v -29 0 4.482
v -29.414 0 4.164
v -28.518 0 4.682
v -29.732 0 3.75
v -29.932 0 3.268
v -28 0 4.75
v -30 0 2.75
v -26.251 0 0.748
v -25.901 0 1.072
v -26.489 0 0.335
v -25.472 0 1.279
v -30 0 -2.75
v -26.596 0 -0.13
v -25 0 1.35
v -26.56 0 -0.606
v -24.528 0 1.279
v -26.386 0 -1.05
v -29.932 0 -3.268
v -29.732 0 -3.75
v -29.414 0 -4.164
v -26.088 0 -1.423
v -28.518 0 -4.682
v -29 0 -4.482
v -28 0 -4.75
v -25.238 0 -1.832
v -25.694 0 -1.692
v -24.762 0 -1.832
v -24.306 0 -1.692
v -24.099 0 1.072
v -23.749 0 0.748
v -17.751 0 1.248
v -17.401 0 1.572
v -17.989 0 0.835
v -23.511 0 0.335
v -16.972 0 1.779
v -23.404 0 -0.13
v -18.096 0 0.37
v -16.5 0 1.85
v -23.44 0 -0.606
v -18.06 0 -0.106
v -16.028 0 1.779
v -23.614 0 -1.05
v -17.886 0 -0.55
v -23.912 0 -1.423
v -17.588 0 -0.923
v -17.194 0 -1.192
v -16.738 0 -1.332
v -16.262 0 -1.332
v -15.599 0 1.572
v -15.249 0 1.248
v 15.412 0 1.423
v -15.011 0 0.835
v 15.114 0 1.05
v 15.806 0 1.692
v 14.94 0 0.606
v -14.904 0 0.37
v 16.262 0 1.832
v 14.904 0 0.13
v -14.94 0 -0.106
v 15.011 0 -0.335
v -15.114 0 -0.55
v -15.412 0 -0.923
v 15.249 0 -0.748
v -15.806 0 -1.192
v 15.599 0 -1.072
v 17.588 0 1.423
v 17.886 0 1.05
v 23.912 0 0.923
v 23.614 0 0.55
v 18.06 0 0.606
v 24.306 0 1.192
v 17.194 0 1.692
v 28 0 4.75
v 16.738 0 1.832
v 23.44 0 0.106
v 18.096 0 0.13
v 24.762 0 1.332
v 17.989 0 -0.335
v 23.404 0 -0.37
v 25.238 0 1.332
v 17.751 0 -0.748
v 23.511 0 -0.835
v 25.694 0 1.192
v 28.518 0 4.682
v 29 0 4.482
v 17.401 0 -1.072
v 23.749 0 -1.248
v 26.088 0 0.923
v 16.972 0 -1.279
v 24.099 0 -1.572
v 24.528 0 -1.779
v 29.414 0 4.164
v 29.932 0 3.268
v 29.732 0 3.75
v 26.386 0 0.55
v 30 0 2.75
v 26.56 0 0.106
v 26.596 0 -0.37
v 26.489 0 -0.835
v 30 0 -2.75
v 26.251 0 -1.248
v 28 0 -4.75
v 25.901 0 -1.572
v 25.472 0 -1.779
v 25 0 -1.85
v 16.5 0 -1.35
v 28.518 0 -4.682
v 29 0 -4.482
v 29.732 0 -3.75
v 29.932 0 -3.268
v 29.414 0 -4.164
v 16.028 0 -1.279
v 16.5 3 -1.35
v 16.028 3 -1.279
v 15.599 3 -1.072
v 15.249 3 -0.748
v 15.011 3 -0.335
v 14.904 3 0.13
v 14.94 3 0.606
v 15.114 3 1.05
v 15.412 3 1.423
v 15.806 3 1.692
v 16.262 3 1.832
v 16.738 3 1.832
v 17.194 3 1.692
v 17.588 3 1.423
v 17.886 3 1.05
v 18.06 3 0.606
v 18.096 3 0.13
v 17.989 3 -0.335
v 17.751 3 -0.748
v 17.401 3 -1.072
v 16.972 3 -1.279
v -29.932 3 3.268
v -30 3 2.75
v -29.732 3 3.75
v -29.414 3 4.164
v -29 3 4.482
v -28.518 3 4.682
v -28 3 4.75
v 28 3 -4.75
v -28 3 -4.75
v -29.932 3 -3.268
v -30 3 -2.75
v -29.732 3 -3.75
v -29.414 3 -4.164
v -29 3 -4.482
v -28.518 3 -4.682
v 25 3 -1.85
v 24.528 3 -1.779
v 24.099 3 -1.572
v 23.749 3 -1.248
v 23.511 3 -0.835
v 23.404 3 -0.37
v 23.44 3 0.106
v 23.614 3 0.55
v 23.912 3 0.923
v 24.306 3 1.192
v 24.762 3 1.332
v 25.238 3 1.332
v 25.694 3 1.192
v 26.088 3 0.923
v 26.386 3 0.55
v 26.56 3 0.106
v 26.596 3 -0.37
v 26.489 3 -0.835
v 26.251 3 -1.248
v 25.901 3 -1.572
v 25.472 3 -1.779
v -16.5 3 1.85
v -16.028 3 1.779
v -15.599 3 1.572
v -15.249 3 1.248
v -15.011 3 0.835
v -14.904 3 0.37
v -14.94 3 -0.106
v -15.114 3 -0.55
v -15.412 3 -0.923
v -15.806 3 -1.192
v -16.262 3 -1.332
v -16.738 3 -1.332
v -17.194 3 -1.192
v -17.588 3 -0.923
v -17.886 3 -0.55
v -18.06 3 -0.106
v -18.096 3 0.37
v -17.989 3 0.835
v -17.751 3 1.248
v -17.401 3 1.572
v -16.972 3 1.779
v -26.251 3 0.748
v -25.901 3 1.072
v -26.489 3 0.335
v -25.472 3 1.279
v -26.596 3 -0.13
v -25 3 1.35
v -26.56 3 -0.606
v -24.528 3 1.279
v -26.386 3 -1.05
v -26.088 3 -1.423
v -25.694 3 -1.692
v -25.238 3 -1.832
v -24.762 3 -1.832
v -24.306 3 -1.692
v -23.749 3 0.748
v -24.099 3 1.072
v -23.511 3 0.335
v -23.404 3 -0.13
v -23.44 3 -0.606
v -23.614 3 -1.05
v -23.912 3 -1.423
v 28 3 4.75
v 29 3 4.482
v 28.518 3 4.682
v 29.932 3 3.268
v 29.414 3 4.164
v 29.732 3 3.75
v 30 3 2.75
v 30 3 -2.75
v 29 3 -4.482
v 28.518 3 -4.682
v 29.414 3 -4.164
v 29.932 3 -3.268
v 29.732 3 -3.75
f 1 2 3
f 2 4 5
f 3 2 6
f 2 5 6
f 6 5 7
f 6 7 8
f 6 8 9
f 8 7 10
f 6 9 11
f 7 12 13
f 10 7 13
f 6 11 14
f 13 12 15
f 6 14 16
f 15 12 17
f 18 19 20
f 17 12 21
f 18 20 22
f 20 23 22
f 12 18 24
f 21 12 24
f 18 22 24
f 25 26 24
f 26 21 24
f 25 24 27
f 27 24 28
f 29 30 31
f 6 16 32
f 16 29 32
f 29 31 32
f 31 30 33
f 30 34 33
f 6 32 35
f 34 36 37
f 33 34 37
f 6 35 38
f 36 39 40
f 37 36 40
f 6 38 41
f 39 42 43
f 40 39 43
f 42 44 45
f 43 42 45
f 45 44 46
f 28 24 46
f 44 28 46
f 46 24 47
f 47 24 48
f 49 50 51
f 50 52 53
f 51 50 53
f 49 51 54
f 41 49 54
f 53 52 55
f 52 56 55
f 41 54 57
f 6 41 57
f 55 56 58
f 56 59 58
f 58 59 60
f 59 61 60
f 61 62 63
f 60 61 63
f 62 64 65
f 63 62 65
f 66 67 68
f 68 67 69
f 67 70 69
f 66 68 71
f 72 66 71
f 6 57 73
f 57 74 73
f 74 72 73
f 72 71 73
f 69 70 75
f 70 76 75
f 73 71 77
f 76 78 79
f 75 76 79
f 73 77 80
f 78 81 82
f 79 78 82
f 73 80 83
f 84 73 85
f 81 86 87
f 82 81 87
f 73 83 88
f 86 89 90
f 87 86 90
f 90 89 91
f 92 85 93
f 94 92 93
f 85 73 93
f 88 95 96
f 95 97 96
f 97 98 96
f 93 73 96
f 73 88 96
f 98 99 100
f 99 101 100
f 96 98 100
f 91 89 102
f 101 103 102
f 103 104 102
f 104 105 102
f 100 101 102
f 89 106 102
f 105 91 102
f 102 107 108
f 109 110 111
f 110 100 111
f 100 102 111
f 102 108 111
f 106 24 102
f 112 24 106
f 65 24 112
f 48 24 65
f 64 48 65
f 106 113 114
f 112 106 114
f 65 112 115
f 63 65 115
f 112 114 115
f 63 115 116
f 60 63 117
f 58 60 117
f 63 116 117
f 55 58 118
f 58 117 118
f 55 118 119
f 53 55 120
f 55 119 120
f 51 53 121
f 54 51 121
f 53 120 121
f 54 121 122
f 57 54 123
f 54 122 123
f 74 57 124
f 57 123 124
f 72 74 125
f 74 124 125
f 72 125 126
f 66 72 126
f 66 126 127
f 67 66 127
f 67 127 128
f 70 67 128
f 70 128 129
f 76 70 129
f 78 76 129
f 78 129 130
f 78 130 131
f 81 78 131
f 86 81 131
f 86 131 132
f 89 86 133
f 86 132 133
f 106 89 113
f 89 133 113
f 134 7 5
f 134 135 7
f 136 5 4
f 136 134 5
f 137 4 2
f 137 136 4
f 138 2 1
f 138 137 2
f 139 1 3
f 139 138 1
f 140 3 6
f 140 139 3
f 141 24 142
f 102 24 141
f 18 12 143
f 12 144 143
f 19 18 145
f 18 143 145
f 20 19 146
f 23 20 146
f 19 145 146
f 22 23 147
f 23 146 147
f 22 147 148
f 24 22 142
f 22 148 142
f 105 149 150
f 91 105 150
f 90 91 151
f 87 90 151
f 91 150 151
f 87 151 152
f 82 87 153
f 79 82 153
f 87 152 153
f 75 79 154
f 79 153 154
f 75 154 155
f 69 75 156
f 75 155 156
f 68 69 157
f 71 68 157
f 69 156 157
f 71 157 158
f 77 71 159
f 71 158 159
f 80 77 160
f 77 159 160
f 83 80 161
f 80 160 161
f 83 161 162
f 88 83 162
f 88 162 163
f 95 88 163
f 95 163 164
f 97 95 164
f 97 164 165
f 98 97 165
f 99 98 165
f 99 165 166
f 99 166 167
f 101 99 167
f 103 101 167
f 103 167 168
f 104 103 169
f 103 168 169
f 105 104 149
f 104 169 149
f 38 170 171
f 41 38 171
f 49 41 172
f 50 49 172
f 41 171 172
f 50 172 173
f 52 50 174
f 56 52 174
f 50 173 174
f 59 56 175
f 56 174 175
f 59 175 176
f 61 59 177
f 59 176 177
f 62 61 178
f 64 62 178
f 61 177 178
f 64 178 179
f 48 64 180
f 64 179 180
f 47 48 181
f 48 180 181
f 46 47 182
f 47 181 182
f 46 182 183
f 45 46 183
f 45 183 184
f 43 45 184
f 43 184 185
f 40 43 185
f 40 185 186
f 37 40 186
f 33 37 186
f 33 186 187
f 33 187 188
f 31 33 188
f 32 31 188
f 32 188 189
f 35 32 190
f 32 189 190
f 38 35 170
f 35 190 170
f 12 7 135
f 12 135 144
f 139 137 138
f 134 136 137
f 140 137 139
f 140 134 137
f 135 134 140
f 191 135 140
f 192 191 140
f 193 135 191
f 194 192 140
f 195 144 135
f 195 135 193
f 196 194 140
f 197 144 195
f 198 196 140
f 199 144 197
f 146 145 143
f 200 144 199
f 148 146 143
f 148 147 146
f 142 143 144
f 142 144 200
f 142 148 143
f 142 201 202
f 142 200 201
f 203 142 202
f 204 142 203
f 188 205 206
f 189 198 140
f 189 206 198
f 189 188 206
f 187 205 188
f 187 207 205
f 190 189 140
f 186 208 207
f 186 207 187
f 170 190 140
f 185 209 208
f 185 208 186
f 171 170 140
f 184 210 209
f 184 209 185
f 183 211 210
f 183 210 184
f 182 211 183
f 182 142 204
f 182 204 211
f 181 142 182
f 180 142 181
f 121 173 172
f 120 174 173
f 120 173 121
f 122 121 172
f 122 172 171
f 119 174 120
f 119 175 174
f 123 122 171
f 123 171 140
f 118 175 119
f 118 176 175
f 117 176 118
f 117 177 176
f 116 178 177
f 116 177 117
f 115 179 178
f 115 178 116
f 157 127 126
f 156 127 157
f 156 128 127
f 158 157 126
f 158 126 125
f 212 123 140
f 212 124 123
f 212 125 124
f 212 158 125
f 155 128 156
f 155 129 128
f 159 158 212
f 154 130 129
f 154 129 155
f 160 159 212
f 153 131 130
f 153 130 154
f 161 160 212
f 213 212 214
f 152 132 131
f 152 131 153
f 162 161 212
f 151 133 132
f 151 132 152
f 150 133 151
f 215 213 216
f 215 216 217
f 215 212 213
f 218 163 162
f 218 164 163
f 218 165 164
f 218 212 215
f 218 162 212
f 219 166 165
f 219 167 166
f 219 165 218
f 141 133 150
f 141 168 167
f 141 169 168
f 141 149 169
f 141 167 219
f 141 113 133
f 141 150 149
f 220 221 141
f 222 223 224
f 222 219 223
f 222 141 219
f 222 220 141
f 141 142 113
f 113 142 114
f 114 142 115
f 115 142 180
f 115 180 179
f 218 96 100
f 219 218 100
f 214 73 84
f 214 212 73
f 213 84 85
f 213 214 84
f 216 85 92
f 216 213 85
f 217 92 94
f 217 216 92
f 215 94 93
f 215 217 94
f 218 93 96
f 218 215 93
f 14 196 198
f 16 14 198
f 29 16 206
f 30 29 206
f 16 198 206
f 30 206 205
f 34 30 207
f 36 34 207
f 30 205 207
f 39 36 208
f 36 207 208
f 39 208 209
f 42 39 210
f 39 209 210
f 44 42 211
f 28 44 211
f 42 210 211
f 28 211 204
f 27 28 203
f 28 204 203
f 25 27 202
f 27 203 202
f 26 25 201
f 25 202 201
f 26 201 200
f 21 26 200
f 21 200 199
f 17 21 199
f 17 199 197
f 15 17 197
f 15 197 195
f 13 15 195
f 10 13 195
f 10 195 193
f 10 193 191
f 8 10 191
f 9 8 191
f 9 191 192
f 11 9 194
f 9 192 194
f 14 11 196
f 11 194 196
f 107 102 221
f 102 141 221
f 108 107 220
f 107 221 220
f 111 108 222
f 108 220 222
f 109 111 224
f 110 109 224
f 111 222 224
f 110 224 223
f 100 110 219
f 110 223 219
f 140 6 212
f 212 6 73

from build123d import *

# Parameters (mm, degrees)
SKETCH_1_W          = 60
SKETCH_1_H          = 9.5
EXTRUDE_1_DEPTH     = 3
SKETCH_2_R          = 1.6
CUT_EXTRUDE_1_DEPTH = 3
FILLET_1_R          = 2


with BuildPart() as part:
    # 草图1 → 凸台-拉伸1 (new body)
    with BuildSketch(Plane(origin=(0, 0, 0), x_dir=(1, 0, 0), z_dir=(0, 1, 0))):
        Rectangle(SKETCH_1_W, SKETCH_1_H)
    extrude(amount=EXTRUDE_1_DEPTH)

    # 草图2 → 切除-拉伸1 (cut)
    with BuildSketch(Plane(origin=(0, 3, 0), x_dir=(1, 0, 0), z_dir=(0, 1, 0))):
        with Locations(Location((-16.5, -0.25, 0), (0, 0, 270))):
            Circle(SKETCH_2_R)
        with Locations(Location((-25, 0.25, 0), (0, 0, 270))):
            Circle(SKETCH_2_R)
        with Locations(Location((25, 0.25, 0), (0, 0, 90))):
            Circle(SKETCH_2_R)
        with Locations(Location((16.5, -0.25, 0), (0, 0, 90))):
            Circle(SKETCH_2_R)
    extrude(amount=-CUT_EXTRUDE_1_DEPTH, mode=Mode.SUBTRACT)

    # 圆角1
    fillet_1_edges = [part.edges().sort_by_distance(p)[0] for p in [
        (-30, 1.5, -4.75),
        (30, 1.5, -4.75),
        (30, 1.5, 4.75),
        (-30, 1.5, 4.75),
    ]]
    fillet(fillet_1_edges, radius=FILLET_1_R)


solid = part.part
